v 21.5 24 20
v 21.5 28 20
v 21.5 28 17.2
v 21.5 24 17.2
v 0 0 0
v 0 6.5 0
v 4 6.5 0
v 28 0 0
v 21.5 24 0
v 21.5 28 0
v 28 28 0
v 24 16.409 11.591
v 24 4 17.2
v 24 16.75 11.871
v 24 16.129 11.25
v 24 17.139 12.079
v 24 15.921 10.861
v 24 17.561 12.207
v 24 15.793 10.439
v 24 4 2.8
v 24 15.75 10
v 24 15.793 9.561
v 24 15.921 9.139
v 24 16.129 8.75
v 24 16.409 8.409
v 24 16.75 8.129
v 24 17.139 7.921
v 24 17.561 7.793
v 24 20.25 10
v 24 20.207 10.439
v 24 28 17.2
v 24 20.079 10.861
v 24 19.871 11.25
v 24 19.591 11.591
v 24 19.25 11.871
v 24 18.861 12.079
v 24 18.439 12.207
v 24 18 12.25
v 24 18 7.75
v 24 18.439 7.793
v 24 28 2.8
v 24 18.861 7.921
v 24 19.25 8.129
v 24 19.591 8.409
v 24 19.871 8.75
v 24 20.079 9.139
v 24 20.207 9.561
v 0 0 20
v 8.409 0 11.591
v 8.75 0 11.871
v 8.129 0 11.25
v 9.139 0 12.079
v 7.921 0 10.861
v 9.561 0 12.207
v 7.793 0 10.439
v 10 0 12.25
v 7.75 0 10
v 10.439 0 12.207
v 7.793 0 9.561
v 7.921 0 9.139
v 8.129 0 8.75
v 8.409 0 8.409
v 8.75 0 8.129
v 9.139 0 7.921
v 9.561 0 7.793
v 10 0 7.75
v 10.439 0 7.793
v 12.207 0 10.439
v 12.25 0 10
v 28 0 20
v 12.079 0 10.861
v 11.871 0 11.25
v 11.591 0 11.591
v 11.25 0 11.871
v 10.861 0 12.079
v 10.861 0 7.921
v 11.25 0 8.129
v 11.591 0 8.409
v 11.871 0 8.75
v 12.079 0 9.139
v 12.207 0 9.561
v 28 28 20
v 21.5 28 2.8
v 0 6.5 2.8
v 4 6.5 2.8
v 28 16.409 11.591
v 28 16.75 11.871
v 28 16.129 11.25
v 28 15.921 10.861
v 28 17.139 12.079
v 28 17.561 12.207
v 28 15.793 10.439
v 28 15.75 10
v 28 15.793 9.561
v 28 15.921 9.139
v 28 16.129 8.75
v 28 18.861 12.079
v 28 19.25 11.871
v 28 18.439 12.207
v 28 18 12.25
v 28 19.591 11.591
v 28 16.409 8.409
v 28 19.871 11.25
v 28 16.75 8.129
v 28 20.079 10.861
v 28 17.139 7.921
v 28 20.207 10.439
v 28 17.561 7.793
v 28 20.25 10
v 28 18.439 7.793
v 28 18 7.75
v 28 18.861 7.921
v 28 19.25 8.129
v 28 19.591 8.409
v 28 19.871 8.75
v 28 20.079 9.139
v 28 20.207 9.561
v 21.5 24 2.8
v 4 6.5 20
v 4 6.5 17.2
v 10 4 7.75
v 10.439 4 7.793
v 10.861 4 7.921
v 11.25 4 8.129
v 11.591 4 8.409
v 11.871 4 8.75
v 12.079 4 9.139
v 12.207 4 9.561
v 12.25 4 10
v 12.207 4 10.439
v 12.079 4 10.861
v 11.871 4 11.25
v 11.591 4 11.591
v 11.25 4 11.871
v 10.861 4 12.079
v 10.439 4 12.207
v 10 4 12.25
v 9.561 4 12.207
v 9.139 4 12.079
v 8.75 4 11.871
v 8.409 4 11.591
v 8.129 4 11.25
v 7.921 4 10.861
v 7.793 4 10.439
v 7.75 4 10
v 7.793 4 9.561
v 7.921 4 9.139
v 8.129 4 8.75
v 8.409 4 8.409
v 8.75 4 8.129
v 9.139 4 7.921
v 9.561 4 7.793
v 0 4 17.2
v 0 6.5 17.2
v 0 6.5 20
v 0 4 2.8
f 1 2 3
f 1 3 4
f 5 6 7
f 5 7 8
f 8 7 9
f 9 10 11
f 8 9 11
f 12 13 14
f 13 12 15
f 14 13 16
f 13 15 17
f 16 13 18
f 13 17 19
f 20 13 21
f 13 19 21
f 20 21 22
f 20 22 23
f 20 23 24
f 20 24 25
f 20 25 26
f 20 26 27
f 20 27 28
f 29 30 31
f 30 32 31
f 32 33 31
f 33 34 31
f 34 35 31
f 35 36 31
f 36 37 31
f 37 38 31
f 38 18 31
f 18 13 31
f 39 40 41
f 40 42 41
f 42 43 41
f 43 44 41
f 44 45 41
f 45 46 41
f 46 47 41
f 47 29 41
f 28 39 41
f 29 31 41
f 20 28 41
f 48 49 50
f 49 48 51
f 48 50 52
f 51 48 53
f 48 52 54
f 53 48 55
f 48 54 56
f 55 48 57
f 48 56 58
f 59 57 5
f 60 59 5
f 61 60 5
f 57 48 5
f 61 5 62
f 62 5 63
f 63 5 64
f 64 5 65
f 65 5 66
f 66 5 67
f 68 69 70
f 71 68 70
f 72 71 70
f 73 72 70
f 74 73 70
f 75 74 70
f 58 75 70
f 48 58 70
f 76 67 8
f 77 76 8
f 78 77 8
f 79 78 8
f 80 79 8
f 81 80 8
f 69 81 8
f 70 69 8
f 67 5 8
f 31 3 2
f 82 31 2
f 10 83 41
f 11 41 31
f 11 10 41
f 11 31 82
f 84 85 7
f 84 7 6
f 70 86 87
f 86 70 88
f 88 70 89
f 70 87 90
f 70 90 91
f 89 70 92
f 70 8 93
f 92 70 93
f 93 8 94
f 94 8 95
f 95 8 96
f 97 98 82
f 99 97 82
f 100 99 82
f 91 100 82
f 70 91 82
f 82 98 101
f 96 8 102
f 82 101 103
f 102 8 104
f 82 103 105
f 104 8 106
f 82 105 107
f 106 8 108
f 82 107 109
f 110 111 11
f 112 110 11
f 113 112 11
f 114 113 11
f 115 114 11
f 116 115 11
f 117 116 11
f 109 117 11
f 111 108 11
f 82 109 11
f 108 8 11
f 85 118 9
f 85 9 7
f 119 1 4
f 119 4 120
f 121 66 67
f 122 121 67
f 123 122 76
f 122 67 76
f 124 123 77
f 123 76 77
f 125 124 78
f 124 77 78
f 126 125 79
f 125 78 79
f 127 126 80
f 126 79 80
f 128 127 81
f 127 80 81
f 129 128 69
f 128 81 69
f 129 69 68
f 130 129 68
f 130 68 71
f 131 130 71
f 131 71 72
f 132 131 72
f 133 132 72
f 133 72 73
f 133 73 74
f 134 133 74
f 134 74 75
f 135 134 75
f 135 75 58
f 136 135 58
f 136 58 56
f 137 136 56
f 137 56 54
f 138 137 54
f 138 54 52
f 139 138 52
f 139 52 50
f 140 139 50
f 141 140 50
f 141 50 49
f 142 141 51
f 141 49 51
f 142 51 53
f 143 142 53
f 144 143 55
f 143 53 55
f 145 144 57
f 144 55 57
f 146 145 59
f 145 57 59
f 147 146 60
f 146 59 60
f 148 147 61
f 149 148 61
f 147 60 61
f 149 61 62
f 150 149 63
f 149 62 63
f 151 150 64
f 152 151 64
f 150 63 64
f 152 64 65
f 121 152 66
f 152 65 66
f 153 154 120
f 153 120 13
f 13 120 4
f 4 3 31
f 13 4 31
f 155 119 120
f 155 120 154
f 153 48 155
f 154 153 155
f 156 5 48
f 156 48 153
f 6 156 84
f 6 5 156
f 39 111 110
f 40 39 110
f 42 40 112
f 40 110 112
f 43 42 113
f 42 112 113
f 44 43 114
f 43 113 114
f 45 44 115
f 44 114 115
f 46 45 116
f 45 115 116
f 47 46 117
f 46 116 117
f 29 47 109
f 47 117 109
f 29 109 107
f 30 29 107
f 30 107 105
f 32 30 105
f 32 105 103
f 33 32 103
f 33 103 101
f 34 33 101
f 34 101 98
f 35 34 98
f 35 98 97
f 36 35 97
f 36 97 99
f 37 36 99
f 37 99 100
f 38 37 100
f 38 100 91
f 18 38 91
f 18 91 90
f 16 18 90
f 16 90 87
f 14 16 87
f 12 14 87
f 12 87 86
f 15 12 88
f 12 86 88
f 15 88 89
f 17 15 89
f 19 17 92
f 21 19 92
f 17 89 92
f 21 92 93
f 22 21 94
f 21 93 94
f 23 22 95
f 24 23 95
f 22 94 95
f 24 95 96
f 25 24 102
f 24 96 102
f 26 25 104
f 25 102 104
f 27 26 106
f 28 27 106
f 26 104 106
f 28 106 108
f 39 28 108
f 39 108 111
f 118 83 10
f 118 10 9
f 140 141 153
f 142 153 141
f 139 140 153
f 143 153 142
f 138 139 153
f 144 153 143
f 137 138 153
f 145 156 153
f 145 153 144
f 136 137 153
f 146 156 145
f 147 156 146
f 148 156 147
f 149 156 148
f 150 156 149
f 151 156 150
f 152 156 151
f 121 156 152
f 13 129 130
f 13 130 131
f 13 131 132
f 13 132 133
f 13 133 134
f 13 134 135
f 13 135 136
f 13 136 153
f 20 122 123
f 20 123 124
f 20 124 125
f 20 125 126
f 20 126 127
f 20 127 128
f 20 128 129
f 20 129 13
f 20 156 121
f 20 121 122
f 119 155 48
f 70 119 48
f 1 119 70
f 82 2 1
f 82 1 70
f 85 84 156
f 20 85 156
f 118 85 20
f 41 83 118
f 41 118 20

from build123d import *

# Parameters (mm, degrees)
SKETCH_1_W          = 28
SKETCH_1_H          = 28
EXTRUDE_1_DEPTH     = 20
CUT_EXTRUDE_1_DEPTH = 20
SKETCH_3_W          = 24
SKETCH_3_H          = 14.4
CUT_EXTRUDE_2_DEPTH = 24
SKETCH_4_R          = 2.25
CUT_EXTRUDE_3_DEPTH = 10
SKETCH_5_R          = 2.25
CUT_EXTRUDE_4_DEPTH = 10


with BuildPart() as part:
    # 草图1 → 凸台-拉伸1 (new body)
    with BuildSketch(Plane.XY):
        with Locations((14, 14)):
            Rectangle(SKETCH_1_W, SKETCH_1_H)
    extrude(amount=EXTRUDE_1_DEPTH)

    # 草图2 → 切除-拉伸1 (cut)
    with BuildSketch(Plane.XY.offset(20)):
        Polygon((21.5, 28), (21.5, 24), (4, 6.5), (0, 6.5), (0, 28), align=None)
    extrude(amount=-CUT_EXTRUDE_1_DEPTH, mode=Mode.SUBTRACT)

    # 草图3 → 切除-拉伸2 (cut)
    with BuildSketch(Plane(origin=(0, 28, 0), x_dir=(1, 0, 0), z_dir=(0, 1, 0))):
        with Locations((12, -10)):
            Rectangle(SKETCH_3_W, SKETCH_3_H)
    extrude(amount=-CUT_EXTRUDE_2_DEPTH, mode=Mode.SUBTRACT)

    # 草图4 → 切除-拉伸3 (cut)
    with BuildSketch(Plane.XZ):
        with Locations(Location((10, 10, 0), (0, 0, 270))):
            Circle(SKETCH_4_R)
    extrude(amount=-CUT_EXTRUDE_3_DEPTH, mode=Mode.SUBTRACT)

    # 草图5 → 切除-拉伸4 (cut)
    with BuildSketch(Plane(origin=(28, 0, 0), x_dir=(0, 0, -1), z_dir=(1, 0, 0))):
        with Locations((-10, 18)):
            Circle(SKETCH_5_R)
    extrude(amount=-CUT_EXTRUDE_4_DEPTH, mode=Mode.SUBTRACT)


solid = part.part
